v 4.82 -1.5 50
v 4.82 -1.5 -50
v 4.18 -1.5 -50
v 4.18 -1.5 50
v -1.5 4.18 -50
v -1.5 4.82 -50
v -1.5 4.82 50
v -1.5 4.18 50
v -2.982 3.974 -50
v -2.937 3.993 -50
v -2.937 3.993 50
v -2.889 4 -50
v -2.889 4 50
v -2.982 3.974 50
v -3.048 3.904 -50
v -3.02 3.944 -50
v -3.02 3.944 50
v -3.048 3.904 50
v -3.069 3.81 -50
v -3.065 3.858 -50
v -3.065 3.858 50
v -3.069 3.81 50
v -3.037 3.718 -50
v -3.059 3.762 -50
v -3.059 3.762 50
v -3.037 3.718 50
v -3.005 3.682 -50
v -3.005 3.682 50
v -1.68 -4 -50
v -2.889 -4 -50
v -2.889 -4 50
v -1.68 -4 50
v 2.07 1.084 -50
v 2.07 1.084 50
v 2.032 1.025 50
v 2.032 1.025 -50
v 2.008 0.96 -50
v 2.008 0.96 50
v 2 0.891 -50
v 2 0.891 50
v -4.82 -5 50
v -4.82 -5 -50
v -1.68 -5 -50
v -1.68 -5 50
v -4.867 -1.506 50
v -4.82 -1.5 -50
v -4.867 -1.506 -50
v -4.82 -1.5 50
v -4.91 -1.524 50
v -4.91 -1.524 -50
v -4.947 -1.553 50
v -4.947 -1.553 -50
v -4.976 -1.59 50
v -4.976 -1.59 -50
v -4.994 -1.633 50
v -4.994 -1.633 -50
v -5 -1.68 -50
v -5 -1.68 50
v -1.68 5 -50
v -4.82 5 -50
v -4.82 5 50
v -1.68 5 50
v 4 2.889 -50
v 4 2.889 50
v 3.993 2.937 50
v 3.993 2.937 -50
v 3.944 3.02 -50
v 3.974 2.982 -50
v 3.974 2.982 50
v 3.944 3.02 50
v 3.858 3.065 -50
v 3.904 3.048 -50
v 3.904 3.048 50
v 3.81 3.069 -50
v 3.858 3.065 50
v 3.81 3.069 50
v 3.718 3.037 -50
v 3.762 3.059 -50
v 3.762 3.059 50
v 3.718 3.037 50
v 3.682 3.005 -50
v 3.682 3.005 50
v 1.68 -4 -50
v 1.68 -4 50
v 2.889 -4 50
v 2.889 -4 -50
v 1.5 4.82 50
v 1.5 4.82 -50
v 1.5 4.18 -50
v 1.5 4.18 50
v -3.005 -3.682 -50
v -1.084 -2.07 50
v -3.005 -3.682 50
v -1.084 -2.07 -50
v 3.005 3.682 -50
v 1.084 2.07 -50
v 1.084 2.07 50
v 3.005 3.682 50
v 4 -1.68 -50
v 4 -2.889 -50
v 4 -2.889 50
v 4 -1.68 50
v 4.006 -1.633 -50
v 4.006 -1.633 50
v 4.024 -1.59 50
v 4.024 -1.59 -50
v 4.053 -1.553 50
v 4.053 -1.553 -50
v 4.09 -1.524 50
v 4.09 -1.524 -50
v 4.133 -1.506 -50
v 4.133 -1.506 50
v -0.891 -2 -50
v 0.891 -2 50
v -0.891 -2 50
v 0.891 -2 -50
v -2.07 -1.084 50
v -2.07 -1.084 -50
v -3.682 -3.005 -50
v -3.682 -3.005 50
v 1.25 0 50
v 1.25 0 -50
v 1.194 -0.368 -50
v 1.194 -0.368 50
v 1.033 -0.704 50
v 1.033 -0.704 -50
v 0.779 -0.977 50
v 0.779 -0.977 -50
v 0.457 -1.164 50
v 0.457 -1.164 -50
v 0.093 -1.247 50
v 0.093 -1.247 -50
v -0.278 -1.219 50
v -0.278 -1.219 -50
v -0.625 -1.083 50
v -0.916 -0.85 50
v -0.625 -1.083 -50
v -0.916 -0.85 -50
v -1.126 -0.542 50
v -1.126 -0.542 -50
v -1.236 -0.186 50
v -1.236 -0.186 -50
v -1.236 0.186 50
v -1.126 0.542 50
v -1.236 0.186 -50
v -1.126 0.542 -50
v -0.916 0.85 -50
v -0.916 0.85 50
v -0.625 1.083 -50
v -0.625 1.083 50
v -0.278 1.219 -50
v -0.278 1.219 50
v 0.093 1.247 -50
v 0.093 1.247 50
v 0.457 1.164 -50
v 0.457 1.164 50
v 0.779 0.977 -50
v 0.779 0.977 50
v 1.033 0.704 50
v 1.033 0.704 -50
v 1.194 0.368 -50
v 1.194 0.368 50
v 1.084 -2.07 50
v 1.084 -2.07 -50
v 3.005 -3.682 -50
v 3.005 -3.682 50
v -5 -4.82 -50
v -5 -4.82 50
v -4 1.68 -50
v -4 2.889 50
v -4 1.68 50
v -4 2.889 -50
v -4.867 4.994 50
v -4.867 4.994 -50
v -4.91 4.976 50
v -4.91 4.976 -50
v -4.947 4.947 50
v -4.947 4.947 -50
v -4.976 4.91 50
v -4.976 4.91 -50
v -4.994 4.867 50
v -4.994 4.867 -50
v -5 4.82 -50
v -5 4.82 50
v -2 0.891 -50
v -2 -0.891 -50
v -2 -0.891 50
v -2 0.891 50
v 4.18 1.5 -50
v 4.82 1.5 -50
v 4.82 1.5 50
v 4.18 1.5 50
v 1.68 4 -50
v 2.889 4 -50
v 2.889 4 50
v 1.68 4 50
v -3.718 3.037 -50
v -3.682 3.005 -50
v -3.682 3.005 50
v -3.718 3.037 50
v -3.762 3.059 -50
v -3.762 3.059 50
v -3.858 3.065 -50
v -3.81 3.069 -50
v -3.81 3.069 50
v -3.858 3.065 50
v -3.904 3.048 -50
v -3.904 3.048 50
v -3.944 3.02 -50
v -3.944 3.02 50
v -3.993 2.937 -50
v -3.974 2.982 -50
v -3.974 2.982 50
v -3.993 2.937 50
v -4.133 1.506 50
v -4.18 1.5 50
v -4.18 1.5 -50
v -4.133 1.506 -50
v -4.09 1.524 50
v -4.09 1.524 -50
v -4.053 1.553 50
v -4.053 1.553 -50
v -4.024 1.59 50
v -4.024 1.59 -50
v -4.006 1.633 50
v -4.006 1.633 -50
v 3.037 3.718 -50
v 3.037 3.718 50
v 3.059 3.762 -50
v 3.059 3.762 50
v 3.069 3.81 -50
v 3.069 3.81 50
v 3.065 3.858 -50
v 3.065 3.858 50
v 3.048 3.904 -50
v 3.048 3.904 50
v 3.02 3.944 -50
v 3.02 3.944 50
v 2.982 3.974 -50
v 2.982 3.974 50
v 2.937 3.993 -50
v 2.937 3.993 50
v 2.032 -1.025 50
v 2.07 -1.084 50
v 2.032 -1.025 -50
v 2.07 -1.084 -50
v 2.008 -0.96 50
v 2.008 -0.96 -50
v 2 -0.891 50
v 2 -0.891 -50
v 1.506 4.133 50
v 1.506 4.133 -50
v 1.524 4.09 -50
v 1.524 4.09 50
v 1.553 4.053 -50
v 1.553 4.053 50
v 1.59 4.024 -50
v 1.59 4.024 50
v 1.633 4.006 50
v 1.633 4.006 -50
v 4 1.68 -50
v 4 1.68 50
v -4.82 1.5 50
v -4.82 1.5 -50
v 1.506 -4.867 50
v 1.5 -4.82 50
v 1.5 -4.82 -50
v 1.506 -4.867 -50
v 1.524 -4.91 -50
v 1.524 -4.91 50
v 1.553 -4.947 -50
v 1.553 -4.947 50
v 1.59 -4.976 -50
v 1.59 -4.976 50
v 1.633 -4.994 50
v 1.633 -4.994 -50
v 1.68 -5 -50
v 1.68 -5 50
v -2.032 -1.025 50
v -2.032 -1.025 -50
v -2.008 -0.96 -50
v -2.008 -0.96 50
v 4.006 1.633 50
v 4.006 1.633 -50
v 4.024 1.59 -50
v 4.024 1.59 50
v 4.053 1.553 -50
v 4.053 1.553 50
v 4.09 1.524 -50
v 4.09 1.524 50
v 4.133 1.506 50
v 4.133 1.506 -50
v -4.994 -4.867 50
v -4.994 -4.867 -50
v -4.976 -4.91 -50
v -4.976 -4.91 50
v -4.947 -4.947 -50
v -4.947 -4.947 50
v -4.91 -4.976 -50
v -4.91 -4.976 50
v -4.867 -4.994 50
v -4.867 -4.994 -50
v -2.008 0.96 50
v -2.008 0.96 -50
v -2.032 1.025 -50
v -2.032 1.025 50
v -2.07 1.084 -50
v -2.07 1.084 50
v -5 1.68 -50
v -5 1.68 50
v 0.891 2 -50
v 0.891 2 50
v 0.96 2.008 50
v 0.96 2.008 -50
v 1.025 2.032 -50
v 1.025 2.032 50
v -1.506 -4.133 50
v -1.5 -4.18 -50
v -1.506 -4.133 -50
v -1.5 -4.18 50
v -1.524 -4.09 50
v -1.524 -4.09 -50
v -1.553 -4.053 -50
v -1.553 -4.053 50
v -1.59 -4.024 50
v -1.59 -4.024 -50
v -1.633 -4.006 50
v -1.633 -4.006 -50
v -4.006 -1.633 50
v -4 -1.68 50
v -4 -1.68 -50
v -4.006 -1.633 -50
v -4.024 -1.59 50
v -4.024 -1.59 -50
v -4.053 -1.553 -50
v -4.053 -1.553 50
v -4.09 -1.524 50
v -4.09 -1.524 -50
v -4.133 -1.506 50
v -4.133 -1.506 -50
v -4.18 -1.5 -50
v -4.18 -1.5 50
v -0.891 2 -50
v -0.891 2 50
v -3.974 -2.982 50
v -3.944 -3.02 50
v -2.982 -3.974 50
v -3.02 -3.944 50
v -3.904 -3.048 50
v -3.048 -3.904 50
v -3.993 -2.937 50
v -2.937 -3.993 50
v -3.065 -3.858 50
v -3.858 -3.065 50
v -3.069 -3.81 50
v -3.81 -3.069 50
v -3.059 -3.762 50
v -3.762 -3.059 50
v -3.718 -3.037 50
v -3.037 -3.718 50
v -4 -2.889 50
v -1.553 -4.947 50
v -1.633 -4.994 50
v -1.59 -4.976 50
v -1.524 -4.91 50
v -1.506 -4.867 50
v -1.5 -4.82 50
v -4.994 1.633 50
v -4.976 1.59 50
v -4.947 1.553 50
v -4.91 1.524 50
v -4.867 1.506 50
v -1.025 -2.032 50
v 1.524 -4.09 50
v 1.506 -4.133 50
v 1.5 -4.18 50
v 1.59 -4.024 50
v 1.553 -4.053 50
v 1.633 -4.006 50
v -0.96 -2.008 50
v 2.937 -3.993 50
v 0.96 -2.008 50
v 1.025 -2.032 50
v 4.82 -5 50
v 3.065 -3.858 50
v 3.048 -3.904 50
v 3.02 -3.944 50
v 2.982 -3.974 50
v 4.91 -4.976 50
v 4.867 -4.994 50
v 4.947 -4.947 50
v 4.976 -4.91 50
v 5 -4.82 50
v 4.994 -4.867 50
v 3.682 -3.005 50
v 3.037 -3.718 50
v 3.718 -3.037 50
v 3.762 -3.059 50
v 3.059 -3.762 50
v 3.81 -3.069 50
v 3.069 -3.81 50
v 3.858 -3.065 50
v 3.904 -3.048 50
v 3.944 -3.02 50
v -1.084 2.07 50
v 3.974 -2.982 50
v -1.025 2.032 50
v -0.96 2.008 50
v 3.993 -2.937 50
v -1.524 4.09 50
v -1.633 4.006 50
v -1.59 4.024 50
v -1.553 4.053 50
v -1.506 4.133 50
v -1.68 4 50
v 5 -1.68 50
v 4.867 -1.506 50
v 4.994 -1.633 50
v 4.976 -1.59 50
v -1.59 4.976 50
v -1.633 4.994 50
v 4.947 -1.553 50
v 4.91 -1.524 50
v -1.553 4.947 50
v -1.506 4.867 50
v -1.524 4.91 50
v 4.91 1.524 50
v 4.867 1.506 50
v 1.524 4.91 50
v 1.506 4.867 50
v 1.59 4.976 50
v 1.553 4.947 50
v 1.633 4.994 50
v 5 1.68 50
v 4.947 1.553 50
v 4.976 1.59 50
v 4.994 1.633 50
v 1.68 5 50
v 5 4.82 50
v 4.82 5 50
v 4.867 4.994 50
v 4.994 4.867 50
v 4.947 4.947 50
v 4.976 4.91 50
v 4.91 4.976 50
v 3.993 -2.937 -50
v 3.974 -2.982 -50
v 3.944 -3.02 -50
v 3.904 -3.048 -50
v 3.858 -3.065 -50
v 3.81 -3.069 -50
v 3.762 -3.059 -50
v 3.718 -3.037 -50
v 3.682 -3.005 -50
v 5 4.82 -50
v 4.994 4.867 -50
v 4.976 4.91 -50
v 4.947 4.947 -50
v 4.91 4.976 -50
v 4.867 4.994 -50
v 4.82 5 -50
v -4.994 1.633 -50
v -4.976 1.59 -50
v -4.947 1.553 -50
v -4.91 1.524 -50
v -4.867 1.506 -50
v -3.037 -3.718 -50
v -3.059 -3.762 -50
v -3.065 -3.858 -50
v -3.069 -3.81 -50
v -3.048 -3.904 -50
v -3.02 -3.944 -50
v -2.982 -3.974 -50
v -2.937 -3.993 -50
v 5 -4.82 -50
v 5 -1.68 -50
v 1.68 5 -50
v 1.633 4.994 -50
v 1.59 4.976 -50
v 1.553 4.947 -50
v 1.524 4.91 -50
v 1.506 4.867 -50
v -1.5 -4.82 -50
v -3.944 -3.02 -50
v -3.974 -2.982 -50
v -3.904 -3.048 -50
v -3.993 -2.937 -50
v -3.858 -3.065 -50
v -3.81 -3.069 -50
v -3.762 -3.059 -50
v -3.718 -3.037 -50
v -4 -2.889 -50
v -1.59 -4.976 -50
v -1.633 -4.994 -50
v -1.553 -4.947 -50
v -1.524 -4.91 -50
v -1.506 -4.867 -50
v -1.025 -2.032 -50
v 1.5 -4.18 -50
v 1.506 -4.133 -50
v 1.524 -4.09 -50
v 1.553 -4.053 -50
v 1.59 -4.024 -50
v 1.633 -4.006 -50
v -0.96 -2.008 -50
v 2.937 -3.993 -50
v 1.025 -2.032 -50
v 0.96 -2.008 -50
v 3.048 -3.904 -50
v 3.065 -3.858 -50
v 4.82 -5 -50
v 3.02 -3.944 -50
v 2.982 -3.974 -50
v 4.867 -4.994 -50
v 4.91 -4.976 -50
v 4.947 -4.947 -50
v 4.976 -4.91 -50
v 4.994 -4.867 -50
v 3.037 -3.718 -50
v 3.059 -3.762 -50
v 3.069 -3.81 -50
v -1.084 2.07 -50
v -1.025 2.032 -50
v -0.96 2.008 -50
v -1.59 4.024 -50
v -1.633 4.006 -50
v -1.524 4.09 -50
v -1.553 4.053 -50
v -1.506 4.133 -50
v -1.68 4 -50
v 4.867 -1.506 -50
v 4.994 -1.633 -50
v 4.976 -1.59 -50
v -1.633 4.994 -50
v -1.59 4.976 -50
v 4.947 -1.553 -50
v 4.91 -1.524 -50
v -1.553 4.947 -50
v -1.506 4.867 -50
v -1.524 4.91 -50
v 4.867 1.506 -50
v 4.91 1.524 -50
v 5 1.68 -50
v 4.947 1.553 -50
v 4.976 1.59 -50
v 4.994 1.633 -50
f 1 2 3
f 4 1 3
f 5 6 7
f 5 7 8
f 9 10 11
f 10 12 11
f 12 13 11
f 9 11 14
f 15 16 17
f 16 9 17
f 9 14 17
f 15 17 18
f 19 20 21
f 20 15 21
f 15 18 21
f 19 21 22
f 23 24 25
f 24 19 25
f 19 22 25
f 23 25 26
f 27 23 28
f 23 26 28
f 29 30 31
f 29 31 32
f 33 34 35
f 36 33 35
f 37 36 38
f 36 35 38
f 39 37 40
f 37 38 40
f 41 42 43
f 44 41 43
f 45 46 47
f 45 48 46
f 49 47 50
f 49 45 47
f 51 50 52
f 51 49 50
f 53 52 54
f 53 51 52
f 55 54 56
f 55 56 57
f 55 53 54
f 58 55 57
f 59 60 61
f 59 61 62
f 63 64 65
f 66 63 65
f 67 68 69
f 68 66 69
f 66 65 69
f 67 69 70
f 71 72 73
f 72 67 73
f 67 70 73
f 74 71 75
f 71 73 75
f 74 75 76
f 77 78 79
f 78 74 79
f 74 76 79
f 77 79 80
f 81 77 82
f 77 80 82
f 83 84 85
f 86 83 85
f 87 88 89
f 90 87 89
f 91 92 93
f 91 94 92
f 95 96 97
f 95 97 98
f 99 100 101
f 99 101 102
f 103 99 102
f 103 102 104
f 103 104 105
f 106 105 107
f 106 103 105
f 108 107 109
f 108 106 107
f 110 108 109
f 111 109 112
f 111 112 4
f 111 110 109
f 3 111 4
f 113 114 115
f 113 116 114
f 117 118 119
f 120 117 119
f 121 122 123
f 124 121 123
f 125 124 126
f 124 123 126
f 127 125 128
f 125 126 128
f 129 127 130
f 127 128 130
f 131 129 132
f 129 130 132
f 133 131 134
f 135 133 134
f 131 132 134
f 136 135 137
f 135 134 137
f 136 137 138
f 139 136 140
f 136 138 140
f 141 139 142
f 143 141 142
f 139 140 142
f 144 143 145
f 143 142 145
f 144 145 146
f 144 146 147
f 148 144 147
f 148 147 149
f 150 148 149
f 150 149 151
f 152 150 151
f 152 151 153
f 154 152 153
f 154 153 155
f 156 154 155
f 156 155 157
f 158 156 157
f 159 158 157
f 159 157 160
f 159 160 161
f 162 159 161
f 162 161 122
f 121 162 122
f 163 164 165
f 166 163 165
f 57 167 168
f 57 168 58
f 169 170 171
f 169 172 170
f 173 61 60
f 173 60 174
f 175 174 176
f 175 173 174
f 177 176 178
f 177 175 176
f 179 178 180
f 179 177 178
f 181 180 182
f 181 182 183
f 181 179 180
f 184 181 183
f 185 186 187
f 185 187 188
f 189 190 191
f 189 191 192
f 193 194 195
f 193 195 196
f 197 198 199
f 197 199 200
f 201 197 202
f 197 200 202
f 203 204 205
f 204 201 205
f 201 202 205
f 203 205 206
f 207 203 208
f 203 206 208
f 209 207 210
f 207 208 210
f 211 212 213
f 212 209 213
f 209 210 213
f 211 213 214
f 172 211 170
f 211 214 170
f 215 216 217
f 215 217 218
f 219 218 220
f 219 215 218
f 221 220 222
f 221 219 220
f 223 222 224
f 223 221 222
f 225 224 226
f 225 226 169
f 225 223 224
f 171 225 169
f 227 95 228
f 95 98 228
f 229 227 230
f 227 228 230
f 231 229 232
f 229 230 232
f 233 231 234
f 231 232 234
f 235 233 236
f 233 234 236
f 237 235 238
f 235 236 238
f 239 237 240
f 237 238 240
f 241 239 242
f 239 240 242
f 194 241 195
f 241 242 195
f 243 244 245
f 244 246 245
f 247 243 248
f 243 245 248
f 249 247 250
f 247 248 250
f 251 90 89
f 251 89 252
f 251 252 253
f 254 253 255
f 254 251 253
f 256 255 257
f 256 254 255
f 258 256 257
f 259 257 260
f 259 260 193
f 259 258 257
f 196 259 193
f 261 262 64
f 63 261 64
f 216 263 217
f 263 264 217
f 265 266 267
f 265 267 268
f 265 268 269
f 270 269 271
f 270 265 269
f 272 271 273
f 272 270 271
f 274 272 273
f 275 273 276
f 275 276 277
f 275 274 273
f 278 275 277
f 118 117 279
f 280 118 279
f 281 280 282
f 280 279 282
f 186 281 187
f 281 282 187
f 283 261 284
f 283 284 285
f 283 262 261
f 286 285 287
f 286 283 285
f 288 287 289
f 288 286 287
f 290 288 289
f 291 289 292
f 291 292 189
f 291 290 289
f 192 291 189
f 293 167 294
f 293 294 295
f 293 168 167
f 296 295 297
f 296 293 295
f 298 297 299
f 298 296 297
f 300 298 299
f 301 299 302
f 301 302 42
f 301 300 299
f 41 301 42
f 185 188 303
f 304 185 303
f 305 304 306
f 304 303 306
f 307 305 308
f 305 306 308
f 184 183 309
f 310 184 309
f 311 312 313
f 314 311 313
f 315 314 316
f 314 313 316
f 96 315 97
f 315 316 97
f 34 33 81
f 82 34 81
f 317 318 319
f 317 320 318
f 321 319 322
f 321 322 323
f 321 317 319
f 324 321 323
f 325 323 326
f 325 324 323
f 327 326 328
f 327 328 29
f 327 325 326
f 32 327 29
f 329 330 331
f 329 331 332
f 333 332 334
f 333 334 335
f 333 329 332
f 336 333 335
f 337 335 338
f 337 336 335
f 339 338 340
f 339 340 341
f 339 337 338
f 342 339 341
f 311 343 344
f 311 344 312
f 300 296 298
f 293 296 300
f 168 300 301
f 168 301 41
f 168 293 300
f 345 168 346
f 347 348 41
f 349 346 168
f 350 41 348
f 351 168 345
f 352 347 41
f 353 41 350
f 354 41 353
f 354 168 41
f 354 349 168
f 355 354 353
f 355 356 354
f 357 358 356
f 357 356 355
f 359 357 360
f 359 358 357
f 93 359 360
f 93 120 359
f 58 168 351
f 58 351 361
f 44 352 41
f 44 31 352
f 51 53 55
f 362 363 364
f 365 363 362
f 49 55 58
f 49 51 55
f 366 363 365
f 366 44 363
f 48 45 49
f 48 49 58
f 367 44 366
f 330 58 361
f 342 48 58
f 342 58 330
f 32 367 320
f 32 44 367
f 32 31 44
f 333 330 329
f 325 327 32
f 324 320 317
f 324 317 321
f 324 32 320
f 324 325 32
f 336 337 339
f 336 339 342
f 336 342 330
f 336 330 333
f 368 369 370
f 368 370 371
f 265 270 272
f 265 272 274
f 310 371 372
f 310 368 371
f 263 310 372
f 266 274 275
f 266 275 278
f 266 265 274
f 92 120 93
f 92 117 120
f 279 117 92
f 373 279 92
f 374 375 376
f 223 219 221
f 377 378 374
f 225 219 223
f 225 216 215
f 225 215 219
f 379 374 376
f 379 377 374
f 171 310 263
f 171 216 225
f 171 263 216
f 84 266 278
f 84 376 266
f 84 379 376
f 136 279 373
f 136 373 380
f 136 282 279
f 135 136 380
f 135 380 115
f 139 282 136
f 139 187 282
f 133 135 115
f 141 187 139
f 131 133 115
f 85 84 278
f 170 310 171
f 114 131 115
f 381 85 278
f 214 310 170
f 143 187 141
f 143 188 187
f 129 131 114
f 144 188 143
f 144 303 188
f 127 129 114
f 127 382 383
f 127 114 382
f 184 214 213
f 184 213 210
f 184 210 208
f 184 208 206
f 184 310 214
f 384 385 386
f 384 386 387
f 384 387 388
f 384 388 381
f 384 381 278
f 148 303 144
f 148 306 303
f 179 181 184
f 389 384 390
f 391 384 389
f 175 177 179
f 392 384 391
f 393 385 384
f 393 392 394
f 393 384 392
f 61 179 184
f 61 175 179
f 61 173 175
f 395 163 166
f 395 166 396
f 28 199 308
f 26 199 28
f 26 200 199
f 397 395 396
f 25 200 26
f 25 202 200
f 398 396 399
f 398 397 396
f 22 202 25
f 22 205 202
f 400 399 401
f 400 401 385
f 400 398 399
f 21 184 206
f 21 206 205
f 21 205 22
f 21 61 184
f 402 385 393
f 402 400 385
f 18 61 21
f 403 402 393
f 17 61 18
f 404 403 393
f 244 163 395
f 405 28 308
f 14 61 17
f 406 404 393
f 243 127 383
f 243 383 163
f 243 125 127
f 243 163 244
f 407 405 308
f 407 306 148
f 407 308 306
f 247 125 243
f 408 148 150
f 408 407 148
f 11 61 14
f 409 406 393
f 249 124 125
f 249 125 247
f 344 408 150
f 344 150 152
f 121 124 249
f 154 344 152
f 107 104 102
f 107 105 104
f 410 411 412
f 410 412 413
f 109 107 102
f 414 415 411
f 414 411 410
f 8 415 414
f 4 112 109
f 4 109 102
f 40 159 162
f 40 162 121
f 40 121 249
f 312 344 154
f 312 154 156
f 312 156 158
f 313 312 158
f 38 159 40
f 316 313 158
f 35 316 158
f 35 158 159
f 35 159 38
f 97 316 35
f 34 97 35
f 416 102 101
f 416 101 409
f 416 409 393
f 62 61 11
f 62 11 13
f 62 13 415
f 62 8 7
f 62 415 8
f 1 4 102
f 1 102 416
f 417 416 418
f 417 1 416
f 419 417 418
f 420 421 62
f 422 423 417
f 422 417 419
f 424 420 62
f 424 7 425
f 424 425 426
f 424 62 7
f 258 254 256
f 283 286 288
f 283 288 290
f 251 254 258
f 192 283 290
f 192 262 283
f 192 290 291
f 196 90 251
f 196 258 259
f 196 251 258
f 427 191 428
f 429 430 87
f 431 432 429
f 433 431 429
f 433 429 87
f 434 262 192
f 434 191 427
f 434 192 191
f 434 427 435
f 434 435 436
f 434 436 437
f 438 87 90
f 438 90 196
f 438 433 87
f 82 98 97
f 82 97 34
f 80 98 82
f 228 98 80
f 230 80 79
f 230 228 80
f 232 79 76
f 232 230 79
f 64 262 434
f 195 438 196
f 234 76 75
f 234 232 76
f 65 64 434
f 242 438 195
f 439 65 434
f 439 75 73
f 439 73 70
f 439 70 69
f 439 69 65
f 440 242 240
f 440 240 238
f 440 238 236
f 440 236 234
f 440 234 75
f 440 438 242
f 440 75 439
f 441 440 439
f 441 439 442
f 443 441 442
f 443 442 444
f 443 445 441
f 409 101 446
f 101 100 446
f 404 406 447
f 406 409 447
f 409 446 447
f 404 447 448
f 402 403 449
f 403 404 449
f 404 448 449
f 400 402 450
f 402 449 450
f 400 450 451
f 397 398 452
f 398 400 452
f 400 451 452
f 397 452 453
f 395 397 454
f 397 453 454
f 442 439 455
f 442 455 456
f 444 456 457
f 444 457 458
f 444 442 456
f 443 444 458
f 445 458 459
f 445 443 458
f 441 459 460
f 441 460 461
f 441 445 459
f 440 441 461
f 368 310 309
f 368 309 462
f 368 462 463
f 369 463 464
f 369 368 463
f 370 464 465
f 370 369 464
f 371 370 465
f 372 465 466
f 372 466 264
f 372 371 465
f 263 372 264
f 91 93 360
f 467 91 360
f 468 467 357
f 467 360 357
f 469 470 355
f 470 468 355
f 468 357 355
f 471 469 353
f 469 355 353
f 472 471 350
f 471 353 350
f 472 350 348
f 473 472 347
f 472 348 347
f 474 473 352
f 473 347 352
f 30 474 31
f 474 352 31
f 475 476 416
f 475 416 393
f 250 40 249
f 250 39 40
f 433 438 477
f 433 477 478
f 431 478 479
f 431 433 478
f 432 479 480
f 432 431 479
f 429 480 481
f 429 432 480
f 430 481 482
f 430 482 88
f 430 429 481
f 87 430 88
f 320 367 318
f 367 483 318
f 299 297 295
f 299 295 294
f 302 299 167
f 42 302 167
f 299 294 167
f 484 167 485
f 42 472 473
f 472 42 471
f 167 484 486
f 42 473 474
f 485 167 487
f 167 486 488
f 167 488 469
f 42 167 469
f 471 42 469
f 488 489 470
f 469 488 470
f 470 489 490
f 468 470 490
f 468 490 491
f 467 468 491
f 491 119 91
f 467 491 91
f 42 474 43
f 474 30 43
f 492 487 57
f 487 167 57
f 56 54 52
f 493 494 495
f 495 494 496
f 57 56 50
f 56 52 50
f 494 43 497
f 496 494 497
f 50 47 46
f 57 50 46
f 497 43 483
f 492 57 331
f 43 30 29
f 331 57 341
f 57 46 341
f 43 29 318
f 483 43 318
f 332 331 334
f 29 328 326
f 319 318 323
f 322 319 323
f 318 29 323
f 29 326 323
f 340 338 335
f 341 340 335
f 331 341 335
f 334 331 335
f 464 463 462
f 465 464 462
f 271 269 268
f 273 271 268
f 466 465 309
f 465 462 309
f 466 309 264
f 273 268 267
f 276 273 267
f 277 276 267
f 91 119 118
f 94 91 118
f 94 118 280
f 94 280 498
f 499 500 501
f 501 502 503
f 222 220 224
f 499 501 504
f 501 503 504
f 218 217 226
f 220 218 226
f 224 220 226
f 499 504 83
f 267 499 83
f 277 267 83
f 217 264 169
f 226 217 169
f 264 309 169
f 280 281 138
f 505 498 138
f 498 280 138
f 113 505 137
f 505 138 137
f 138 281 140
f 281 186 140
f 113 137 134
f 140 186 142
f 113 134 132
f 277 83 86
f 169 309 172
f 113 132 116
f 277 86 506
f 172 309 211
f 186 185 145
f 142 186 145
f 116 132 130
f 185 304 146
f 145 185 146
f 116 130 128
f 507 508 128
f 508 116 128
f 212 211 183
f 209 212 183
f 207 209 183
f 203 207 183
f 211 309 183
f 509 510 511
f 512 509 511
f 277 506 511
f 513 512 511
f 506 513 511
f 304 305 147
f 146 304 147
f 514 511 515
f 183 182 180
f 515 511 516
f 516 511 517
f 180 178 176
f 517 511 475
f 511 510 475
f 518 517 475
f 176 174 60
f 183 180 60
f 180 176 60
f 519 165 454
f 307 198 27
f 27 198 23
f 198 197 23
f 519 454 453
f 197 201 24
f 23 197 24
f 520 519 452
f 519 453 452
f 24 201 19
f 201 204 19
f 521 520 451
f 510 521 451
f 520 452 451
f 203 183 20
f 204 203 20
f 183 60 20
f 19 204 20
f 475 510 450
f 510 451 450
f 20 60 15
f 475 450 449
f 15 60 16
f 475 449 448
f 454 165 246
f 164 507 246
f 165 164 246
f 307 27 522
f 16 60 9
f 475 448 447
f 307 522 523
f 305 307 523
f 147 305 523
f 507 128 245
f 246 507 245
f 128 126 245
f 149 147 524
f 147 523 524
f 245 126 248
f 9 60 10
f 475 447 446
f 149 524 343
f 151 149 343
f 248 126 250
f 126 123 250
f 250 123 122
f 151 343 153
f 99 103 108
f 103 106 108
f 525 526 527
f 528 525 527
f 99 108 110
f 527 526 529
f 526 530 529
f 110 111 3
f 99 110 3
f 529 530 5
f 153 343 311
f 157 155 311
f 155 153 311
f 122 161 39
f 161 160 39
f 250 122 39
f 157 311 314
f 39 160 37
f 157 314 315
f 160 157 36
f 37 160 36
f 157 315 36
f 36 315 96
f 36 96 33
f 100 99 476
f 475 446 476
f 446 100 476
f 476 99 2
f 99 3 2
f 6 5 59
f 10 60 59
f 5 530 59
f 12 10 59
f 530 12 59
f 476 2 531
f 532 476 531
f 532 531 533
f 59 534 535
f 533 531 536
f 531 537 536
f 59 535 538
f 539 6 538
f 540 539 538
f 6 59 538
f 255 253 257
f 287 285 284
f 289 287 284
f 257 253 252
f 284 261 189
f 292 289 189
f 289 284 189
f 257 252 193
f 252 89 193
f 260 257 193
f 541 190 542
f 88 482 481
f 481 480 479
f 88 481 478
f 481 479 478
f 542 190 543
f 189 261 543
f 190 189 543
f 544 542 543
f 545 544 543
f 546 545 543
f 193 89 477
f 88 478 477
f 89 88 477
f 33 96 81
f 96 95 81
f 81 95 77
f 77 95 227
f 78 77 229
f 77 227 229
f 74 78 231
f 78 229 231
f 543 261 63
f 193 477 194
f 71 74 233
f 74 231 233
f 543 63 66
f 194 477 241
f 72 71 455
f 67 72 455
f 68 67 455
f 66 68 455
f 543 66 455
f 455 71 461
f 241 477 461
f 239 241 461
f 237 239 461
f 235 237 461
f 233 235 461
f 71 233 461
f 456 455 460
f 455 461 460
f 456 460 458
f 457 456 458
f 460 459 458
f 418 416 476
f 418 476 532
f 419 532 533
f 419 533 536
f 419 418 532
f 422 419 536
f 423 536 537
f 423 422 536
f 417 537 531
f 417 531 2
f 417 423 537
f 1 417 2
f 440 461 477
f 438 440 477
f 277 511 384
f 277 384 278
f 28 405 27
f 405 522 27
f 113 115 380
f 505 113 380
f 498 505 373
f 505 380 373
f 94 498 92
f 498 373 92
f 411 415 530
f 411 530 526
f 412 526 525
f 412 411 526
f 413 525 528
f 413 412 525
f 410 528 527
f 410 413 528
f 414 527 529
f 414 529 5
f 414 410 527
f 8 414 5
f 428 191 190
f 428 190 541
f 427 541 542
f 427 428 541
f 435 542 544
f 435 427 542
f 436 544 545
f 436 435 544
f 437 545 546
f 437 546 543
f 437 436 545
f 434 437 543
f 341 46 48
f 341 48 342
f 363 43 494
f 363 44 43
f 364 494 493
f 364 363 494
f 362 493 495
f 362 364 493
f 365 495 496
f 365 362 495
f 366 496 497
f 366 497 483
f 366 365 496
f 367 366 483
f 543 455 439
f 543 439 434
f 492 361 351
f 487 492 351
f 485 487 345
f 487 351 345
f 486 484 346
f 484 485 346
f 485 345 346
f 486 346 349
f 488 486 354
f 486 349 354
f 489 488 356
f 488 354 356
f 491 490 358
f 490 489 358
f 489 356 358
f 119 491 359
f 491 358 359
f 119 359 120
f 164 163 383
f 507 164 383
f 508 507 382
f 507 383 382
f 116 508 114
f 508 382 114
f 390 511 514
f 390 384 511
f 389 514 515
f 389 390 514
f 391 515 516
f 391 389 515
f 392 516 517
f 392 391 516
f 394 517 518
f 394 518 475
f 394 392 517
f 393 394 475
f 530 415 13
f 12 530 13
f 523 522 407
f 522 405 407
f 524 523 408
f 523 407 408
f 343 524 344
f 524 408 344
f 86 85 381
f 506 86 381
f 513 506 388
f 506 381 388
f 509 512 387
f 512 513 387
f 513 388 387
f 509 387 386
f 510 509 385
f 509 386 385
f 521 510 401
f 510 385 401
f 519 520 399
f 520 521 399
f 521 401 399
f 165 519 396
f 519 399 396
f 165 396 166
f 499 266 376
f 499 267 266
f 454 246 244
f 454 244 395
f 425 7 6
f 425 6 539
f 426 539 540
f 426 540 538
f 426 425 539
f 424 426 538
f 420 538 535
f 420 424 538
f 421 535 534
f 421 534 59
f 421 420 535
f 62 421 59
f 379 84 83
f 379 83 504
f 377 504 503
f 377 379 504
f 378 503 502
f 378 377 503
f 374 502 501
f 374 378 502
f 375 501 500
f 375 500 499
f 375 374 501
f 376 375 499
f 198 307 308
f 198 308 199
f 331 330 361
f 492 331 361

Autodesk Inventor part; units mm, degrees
ref_plane "YZ Plane" through (0, 0, 0) normal (1, 0, 0) x (0, 1, 0)
ref_plane "XZ Plane" through (0, 0, 0) normal (0, 1, 0) x (-1, 0, 0)
ref_plane "XY Plane" through (0, 0, 0) normal (0, 0, 1) x (1, 0, 0)
sketch "Sketch1" plane through (0, 0, 0) normal (0, 0, 1) x (1, 0, 0)
  circle A0 centre (0, 0) radius 1.25
  line L0 (0, -7) -> (0, 7) projected
  line L1 (-7.0223, 0) -> (7.1337, 0) projected
  line L2 (5, 5) -> (1.5, 5)
  line L3 (1.5, 5) -> (1.5, 4)
  line L4 (5, 5) -> (5, 1.5)
  line L5 (-1, 2) -> (1, 2)
  line L6 (2, 1) -> (2, -1)
  line L7 (1, -2) -> (-1, -2)
  line L8 (-2, -1) -> (-2, 1)
  line L9 (1, 2) -> (3.3835, 4)
  line L10 (2, 2) -> (4.1114, 2) construction
  line L11 (3.3835, 4) -> (1.5, 4)
  line L12 (2, 1) -> (4, 3.3835)
  line L13 (2, 1) -> (5.1114, 1) construction
  line L14 (5, 1.5) -> (4, 1.5)
  line L15 (4, 1.5) -> (4, 3.3835)
  line L16 (5, 5) -> (5, 1.5)
  line L17 (-5, 5) -> (-1.5, 5)
  line L18 (1.5, 5) -> (5, 5)
  line L19 (5, 5) -> (5, 1.5)
  line L20 (5, 0) -> (5, -5)
  line L21 (-2, 1) -> (-4, 3.3835)
  line L22 (-4, 3.3835) -> (-4, 1.5)
  line L23 (-5, 1.5) -> (-4, 1.5)
  line L24 (-5, 5) -> (-5, 1.5)
  line L25 (-5, 5) -> (-1.5, 5)
  line L26 (-1.5, 5) -> (-1.5, 4)
  line L27 (-1.5, 4) -> (-3.3835, 4)
  line L28 (-1, 2) -> (-3.3835, 4)
  line L29 (-1, -2) -> (-3.3835, -4)
  line L30 (-3.3835, -4) -> (-1.5, -4)
  line L31 (-1.5, -5) -> (-1.5, -4)
  line L32 (-5, -5) -> (-1.5, -5)
  line L33 (-5, -5) -> (-5, -1.5)
  line L34 (-5, -1.5) -> (-4, -1.5)
  line L35 (-4, -1.5) -> (-4, -3.3835)
  line L36 (-2, -1) -> (-4, -3.3835)
  line L37 (2, -1) -> (4, -3.3835)
  line L38 (4, -3.3835) -> (4, -1.5)
  line L39 (5, -1.5) -> (4, -1.5)
  line L40 (5, -5) -> (5, -1.5)
  line L41 (5, -5) -> (1.5, -5)
  line L42 (1.5, -5) -> (1.5, -4)
  line L43 (1.5, -4) -> (3.3835, -4)
  line L44 (1, -2) -> (3.3835, -4)
  line L45 (-5, -5) -> (-5, -1.5)
  line L46 (-5, 1.5) -> (-5, 5)
  line L47 (5, -5) -> (1.5, -5)
  line L48 (-1.5, -5) -> (-5, -5)
  dimension "d0" = 2.5
  dimension "d3" = 3.5
  dimension "d4" = 1
  dimension "d5" = 90
  dimension "d6" = 3.5
  dimension "d10" = 2
  dimension "d11" = 40
  dimension "d13" = 50
  dimension "d14" = 1
  dimension "d17" = 360
  dimension "d19" = 3.1115
extrude "Extrusion1" add sketch "Sketch1" along normal mid plane 100 contours L1 L6 L37 L38 L39 L20 L41 L42 L43 L44 L7 L0 A0 | A0 L0 L5 L9 L11 L3 L2 L4 L14 L15 L12 L6 L1 | A0 L1 L8 L21 L22 L23 L24 L17 L26 L27 L28 L5 L0 | L0 L7 L29 L30 L31 L32 L33 L34 L35 L36 L8 L1 A0
fillet "Fillet1" radius 0.18 28 edges at (-5, 5, 0) (-5, 1.5, 0) (-1.5, 5, 0) (-1.5, 4, 0) (-4, 1.5, 0) (-3.3835, 4, 0) (-4, 3.3835, 0) (1.5, 5, 0) (5, 5, 0) (3.3835, 4, 0) (4, 3.3835, 0) (4, 1.5, 0) (5, 1.5, 0) (1.5, 4, 0) (4, -1.5, 0) (5, -1.5, 0) (5, -5, 0) (4, -3.3835, 0) (3.3835, -4, 0) (1.5, -4, 0) (1.5, -5, 0) (-3.3835, -4, 0) (-4, -3.3835, 0) (-4, -1.5, 0) (-5, -1.5, 0) (-5, -5, 0) (-1.5, -5, 0) (-1.5, -4, 0)
fillet "Fillet2" radius 0.3 8 edges at (-1, 2, 0) (1, 2, 0) (2, -1, 0) (2, 1, 0) (1, -2, 0) (-1, -2, 0) (-2, -1, 0) (-2, 1, 0)
thread "Thread1" size "M3x0.5" class "6H" standard "ANSI Metric M Profile" length 8
thread "Thread2" size "M3x0.5" class "6H" standard "ANSI Metric M Profile" length 8
properties part number "Beam_10mm"
